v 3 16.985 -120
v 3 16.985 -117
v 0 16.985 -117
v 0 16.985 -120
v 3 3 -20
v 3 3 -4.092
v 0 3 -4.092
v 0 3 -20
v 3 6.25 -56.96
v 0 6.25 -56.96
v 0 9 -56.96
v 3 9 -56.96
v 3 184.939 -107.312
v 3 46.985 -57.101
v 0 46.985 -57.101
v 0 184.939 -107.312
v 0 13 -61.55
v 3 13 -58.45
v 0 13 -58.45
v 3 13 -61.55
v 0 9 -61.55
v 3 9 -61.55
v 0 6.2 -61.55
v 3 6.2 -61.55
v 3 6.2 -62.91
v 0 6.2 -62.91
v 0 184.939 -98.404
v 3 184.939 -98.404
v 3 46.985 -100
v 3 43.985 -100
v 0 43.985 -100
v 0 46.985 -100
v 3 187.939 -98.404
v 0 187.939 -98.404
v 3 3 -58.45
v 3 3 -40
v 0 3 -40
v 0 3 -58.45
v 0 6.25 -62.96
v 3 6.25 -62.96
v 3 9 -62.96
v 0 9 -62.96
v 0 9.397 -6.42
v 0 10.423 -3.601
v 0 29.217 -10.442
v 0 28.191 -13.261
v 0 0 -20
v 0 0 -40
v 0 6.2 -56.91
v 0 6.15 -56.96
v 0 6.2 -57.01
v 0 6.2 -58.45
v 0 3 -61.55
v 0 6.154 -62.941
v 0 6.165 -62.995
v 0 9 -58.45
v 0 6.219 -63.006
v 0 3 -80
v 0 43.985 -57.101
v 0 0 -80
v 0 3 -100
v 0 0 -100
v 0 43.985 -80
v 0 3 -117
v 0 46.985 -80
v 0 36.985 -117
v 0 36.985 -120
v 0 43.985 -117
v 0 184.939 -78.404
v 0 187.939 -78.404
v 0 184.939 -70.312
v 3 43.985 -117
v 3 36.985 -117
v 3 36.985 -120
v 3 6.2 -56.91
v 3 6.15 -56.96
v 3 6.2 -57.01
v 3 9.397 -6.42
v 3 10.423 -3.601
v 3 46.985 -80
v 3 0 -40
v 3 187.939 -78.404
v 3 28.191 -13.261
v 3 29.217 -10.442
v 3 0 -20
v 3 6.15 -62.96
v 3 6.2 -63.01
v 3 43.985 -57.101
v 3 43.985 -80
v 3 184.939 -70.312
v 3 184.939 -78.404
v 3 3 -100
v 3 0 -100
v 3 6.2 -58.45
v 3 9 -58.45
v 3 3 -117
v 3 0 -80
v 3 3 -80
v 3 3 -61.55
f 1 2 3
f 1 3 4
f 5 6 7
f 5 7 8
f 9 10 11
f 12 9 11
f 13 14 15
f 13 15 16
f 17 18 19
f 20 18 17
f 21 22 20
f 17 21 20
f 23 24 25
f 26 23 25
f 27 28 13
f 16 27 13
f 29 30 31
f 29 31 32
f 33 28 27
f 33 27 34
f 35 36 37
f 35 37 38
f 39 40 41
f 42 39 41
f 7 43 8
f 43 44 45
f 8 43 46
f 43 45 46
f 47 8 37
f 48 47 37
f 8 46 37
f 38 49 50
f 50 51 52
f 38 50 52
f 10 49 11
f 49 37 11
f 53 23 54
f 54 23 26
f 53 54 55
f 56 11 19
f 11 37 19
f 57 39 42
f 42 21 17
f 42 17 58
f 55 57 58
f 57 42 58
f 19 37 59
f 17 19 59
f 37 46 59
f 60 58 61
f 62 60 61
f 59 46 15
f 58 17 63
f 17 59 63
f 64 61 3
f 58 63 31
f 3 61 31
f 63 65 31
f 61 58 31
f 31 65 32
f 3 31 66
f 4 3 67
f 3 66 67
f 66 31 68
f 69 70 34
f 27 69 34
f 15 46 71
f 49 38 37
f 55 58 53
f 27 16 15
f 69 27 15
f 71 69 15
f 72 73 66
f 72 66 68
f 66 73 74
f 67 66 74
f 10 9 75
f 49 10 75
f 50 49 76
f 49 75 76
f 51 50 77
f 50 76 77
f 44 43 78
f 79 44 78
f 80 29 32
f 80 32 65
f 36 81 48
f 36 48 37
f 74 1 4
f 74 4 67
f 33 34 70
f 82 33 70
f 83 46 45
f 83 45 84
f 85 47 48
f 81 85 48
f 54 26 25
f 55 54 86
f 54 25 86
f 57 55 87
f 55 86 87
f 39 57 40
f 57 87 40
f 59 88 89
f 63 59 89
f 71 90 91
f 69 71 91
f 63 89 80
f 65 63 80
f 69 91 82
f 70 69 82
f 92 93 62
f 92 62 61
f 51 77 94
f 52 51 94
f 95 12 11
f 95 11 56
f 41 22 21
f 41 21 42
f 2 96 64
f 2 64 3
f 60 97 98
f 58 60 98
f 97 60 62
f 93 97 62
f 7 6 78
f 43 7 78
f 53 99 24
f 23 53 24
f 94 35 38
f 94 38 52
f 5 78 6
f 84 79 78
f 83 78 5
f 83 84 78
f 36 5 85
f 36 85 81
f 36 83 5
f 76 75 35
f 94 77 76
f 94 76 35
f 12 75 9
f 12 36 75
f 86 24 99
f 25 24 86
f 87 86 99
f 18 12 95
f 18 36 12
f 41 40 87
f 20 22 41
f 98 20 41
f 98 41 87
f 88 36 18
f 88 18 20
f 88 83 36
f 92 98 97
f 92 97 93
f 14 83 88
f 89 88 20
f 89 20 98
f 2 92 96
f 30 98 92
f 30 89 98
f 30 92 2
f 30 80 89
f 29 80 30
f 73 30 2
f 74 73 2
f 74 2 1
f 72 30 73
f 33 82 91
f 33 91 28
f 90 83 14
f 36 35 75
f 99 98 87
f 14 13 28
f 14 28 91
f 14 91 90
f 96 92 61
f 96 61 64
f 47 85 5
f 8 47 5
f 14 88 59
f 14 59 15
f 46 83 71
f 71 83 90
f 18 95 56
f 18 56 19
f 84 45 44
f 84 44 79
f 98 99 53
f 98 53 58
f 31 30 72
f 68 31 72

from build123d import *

# Parameters (mm, degrees)
BOSS_EXTRUDE1_DEPTH = 3
CUT_EXTRUDE1_DEPTH  = 267.131484195
SKETCH3_W           = 29.976768642
SKETCH3_H           = 52.268511193
CUT_EXTRUDE2_DEPTH  = 233.651187464
SKETCH5_W           = 11.091910703
SKETCH5_H           = 3
SKETCH5_W_2         = 10
CUT_EXTRUDE4_DEPTH  = 224.001992956
SKETCH6_W           = 20
SKETCH6_H           = 3
CUT_EXTRUDE5_DEPTH  = 224.001992956
SKETCH7_W           = 40
SKETCH7_H           = 3
CUT_EXTRUDE6_DEPTH  = 224.001992956
CUT_EXTRUDE7_REACH  = 225.002
SKETCH8_W           = 20
SKETCH8_H           = 3
CUT_EXTRUDE8_REACH  = 225.002
SKETCH9_W           = 22.898992834
SKETCH9_H           = 3
SKETCH10_W          = 3
SKETCH10_H          = 7
SKETCH10_H_2        = 13.984631039
CUT_EXTRUDE9_DEPTH  = 224.001992956
CUT_EXTRUDE10_DEPTH = 10
SKETCH13_W          = 3
SKETCH13_H          = 20
BOSS_EXTRUDE2_DEPTH = 3
CUT_EXTRUDE11_REACH = 225.002
SKETCH14_W          = 3.1
SKETCH14_H          = 10
SKETCH15_W          = 6
SKETCH15_H          = 2.8
CUT_EXTRUDE12_DEPTH = 224.001992956
SKETCH16_R          = 0.05
CUT_EXTRUDE13_DEPTH = 224.001992956
SKETCH17_R          = 0.05
CUT_EXTRUDE14_DEPTH = 10


with BuildPart() as part:
    # Sketch1 → Boss-Extrude1 (new body)
    with BuildSketch(Plane(origin=(0, 0, 0), x_dir=(0, 0, -1), z_dir=(1, 0, 0))):
        Polygon((0, 0), (120, 0), (188.404028665, 187.938524157), (68.404028665, 187.938524157), align=None)
    extrude(amount=BOSS_EXTRUDE1_DEPTH)

    # Sketch2 → Cut-Extrude1 (cut, through all)
    with BuildSketch(Plane(origin=(3, 0, 0), x_dir=(0, 0, -1), z_dir=(1, 0, 0))):
        Polygon((188.404028665, 187.938524157), (137.101007166, 46.984631039), (57.101007166, 46.984631039), (108.404028665, 187.938524157), align=None)
    extrude(amount=-CUT_EXTRUDE1_DEPTH, mode=Mode.SUBTRACT)

    # Sketch3 → Cut-Extrude2 (cut, through all)
    with BuildSketch(Plane(origin=(3, 0, 0), x_dir=(0, 0, -1), z_dir=(1, 0, 0))):
        with Locations((134.988384321, 26.134255597)):
            Rectangle(SKETCH3_W, SKETCH3_H)
    extrude(amount=-CUT_EXTRUDE2_DEPTH, mode=Mode.SUBTRACT)

    # Sketch5 → Cut-Extrude4 (cut, through all)
    with BuildSketch(Plane(origin=(3, 0, 0), x_dir=(0, 0, -1), z_dir=(1, 0, 0))):
        with Locations((72.858073314, 186.438524157)):
            Rectangle(SKETCH5_W, SKETCH5_H)
        with Locations((103.404028665, 186.438524157)):
            Rectangle(SKETCH5_W_2, SKETCH5_H)
    extrude(amount=-CUT_EXTRUDE4_DEPTH, mode=Mode.SUBTRACT)

    # Sketch6 → Cut-Extrude5 (cut, through all)
    with BuildSketch(Plane(origin=(3, 0, 0), x_dir=(0, 0, -1), z_dir=(1, 0, 0))):
        with Locations((110, 1.5)):
            Rectangle(SKETCH6_W, SKETCH6_H)
        with Locations((10, 1.5)):
            Rectangle(SKETCH6_W, SKETCH6_H)
    extrude(amount=-CUT_EXTRUDE5_DEPTH, mode=Mode.SUBTRACT)

    # Sketch7 → Cut-Extrude6 (cut, through all)
    with BuildSketch(Plane(origin=(3, 0, 0), x_dir=(0, 0, -1), z_dir=(1, 0, 0))):
        with Locations((60, 1.5)):
            Rectangle(SKETCH7_W, SKETCH7_H)
    extrude(amount=-CUT_EXTRUDE6_DEPTH, mode=Mode.SUBTRACT)

    # Sketch8 → Cut-Extrude7 (cut, up to next)
    with BuildSketch(Plane(origin=(3, 0, 0), x_dir=(0, 0, -1), z_dir=(1, 0, 0)), mode=Mode.PRIVATE) as cut_extrude7_sk1:
        with Locations((110, 45.484631039)):
            Rectangle(SKETCH8_W, SKETCH8_H)
    cut_extrude7_tool1 = extrude(cut_extrude7_sk1.sketch, amount=-CUT_EXTRUDE7_REACH, mode=Mode.PRIVATE) & part.part
    add(cut_extrude7_tool1.solids().sort_by_distance((3, 45.484631, -110))[0], mode=Mode.SUBTRACT)

    # Sketch9 → Cut-Extrude8 (cut, up to next)
    with BuildSketch(Plane(origin=(3, 0, 0), x_dir=(0, 0, -1), z_dir=(1, 0, 0)), mode=Mode.PRIVATE) as cut_extrude8_sk1:
        with Locations((68.550503583, 45.484631039)):
            Rectangle(SKETCH9_W, SKETCH9_H)
    cut_extrude8_tool1 = extrude(cut_extrude8_sk1.sketch, amount=-CUT_EXTRUDE8_REACH, mode=Mode.PRIVATE) & part.part
    add(cut_extrude8_tool1.solids().sort_by_distance((3, 45.484631, -68.550504))[0], mode=Mode.SUBTRACT)

    # Sketch10 → Cut-Extrude9 (cut, through all)
    with BuildSketch(Plane(origin=(3, 0, 0), x_dir=(0, 0, -1), z_dir=(1, 0, 0))):
        with Locations((118.5, 40.484631039)):
            Rectangle(SKETCH10_W, SKETCH10_H)
        with Locations((118.5, 9.992315519)):
            Rectangle(SKETCH10_W, SKETCH10_H_2)
    extrude(amount=-CUT_EXTRUDE9_DEPTH, mode=Mode.SUBTRACT)

    # Sketch11 → Cut-Extrude10 (cut)
    with BuildSketch(Plane(origin=(3, 0, 0), x_dir=(0, 0, -1), z_dir=(1, 0, 0))):
        Polygon((67.312117962, 184.938524157), (1.091910703, 3), (4.091910703, 3), (70.312117962, 184.938524157), align=None)
    extrude(amount=-CUT_EXTRUDE10_DEPTH, mode=Mode.SUBTRACT)

    # Sketch13 → Boss-Extrude2 (add)
    with BuildSketch(Plane(origin=(0, -0.964181415, -2.649066665), x_dir=(1, 0, 0), z_dir=(0, 0.3420201433256657, 0.9396926207859095))):
        with Locations((1.5, 21.02606043)):
            Rectangle(SKETCH13_W, SKETCH13_H)
    extrude(amount=BOSS_EXTRUDE2_DEPTH)

    # Sketch14 → Cut-Extrude11 (cut, up to next)
    with BuildSketch(Plane(origin=(3, 0, 0), x_dir=(0, 0, -1), z_dir=(1, 0, 0)), mode=Mode.PRIVATE) as cut_extrude11_sk1:
        with Locations((60, 8)):
            Rectangle(SKETCH14_W, SKETCH14_H)
    cut_extrude11_tool1 = extrude(cut_extrude11_sk1.sketch, amount=-CUT_EXTRUDE11_REACH, mode=Mode.PRIVATE) & part.part
    add(cut_extrude11_tool1.solids().sort_by_distance((3, 8, -60))[0], mode=Mode.SUBTRACT)

    # Sketch15 → Cut-Extrude12 (cut, through all)
    with BuildSketch(Plane(origin=(3, 0, 0), x_dir=(0, 0, -1), z_dir=(1, 0, 0))):
        with Locations((59.96, 7.6)):
            Rectangle(SKETCH15_W, SKETCH15_H)
    extrude(amount=-CUT_EXTRUDE12_DEPTH, mode=Mode.SUBTRACT)

    # Sketch16 → Cut-Extrude13 (cut, through all)
    with BuildSketch(Plane(origin=(3, 0, 0), x_dir=(0, 0, -1), z_dir=(1, 0, 0))):
        with Locations((56.96, 6.2)):
            Circle(SKETCH16_R)
    extrude(amount=-CUT_EXTRUDE13_DEPTH, mode=Mode.SUBTRACT)

    # Sketch17 → Cut-Extrude14 (cut)
    with BuildSketch(Plane(origin=(3, 0, 0), x_dir=(0, 0, -1), z_dir=(1, 0, 0))):
        with Locations((62.96, 6.2)):
            Circle(SKETCH17_R)
    extrude(amount=-CUT_EXTRUDE14_DEPTH, mode=Mode.SUBTRACT)


solid = part.part
